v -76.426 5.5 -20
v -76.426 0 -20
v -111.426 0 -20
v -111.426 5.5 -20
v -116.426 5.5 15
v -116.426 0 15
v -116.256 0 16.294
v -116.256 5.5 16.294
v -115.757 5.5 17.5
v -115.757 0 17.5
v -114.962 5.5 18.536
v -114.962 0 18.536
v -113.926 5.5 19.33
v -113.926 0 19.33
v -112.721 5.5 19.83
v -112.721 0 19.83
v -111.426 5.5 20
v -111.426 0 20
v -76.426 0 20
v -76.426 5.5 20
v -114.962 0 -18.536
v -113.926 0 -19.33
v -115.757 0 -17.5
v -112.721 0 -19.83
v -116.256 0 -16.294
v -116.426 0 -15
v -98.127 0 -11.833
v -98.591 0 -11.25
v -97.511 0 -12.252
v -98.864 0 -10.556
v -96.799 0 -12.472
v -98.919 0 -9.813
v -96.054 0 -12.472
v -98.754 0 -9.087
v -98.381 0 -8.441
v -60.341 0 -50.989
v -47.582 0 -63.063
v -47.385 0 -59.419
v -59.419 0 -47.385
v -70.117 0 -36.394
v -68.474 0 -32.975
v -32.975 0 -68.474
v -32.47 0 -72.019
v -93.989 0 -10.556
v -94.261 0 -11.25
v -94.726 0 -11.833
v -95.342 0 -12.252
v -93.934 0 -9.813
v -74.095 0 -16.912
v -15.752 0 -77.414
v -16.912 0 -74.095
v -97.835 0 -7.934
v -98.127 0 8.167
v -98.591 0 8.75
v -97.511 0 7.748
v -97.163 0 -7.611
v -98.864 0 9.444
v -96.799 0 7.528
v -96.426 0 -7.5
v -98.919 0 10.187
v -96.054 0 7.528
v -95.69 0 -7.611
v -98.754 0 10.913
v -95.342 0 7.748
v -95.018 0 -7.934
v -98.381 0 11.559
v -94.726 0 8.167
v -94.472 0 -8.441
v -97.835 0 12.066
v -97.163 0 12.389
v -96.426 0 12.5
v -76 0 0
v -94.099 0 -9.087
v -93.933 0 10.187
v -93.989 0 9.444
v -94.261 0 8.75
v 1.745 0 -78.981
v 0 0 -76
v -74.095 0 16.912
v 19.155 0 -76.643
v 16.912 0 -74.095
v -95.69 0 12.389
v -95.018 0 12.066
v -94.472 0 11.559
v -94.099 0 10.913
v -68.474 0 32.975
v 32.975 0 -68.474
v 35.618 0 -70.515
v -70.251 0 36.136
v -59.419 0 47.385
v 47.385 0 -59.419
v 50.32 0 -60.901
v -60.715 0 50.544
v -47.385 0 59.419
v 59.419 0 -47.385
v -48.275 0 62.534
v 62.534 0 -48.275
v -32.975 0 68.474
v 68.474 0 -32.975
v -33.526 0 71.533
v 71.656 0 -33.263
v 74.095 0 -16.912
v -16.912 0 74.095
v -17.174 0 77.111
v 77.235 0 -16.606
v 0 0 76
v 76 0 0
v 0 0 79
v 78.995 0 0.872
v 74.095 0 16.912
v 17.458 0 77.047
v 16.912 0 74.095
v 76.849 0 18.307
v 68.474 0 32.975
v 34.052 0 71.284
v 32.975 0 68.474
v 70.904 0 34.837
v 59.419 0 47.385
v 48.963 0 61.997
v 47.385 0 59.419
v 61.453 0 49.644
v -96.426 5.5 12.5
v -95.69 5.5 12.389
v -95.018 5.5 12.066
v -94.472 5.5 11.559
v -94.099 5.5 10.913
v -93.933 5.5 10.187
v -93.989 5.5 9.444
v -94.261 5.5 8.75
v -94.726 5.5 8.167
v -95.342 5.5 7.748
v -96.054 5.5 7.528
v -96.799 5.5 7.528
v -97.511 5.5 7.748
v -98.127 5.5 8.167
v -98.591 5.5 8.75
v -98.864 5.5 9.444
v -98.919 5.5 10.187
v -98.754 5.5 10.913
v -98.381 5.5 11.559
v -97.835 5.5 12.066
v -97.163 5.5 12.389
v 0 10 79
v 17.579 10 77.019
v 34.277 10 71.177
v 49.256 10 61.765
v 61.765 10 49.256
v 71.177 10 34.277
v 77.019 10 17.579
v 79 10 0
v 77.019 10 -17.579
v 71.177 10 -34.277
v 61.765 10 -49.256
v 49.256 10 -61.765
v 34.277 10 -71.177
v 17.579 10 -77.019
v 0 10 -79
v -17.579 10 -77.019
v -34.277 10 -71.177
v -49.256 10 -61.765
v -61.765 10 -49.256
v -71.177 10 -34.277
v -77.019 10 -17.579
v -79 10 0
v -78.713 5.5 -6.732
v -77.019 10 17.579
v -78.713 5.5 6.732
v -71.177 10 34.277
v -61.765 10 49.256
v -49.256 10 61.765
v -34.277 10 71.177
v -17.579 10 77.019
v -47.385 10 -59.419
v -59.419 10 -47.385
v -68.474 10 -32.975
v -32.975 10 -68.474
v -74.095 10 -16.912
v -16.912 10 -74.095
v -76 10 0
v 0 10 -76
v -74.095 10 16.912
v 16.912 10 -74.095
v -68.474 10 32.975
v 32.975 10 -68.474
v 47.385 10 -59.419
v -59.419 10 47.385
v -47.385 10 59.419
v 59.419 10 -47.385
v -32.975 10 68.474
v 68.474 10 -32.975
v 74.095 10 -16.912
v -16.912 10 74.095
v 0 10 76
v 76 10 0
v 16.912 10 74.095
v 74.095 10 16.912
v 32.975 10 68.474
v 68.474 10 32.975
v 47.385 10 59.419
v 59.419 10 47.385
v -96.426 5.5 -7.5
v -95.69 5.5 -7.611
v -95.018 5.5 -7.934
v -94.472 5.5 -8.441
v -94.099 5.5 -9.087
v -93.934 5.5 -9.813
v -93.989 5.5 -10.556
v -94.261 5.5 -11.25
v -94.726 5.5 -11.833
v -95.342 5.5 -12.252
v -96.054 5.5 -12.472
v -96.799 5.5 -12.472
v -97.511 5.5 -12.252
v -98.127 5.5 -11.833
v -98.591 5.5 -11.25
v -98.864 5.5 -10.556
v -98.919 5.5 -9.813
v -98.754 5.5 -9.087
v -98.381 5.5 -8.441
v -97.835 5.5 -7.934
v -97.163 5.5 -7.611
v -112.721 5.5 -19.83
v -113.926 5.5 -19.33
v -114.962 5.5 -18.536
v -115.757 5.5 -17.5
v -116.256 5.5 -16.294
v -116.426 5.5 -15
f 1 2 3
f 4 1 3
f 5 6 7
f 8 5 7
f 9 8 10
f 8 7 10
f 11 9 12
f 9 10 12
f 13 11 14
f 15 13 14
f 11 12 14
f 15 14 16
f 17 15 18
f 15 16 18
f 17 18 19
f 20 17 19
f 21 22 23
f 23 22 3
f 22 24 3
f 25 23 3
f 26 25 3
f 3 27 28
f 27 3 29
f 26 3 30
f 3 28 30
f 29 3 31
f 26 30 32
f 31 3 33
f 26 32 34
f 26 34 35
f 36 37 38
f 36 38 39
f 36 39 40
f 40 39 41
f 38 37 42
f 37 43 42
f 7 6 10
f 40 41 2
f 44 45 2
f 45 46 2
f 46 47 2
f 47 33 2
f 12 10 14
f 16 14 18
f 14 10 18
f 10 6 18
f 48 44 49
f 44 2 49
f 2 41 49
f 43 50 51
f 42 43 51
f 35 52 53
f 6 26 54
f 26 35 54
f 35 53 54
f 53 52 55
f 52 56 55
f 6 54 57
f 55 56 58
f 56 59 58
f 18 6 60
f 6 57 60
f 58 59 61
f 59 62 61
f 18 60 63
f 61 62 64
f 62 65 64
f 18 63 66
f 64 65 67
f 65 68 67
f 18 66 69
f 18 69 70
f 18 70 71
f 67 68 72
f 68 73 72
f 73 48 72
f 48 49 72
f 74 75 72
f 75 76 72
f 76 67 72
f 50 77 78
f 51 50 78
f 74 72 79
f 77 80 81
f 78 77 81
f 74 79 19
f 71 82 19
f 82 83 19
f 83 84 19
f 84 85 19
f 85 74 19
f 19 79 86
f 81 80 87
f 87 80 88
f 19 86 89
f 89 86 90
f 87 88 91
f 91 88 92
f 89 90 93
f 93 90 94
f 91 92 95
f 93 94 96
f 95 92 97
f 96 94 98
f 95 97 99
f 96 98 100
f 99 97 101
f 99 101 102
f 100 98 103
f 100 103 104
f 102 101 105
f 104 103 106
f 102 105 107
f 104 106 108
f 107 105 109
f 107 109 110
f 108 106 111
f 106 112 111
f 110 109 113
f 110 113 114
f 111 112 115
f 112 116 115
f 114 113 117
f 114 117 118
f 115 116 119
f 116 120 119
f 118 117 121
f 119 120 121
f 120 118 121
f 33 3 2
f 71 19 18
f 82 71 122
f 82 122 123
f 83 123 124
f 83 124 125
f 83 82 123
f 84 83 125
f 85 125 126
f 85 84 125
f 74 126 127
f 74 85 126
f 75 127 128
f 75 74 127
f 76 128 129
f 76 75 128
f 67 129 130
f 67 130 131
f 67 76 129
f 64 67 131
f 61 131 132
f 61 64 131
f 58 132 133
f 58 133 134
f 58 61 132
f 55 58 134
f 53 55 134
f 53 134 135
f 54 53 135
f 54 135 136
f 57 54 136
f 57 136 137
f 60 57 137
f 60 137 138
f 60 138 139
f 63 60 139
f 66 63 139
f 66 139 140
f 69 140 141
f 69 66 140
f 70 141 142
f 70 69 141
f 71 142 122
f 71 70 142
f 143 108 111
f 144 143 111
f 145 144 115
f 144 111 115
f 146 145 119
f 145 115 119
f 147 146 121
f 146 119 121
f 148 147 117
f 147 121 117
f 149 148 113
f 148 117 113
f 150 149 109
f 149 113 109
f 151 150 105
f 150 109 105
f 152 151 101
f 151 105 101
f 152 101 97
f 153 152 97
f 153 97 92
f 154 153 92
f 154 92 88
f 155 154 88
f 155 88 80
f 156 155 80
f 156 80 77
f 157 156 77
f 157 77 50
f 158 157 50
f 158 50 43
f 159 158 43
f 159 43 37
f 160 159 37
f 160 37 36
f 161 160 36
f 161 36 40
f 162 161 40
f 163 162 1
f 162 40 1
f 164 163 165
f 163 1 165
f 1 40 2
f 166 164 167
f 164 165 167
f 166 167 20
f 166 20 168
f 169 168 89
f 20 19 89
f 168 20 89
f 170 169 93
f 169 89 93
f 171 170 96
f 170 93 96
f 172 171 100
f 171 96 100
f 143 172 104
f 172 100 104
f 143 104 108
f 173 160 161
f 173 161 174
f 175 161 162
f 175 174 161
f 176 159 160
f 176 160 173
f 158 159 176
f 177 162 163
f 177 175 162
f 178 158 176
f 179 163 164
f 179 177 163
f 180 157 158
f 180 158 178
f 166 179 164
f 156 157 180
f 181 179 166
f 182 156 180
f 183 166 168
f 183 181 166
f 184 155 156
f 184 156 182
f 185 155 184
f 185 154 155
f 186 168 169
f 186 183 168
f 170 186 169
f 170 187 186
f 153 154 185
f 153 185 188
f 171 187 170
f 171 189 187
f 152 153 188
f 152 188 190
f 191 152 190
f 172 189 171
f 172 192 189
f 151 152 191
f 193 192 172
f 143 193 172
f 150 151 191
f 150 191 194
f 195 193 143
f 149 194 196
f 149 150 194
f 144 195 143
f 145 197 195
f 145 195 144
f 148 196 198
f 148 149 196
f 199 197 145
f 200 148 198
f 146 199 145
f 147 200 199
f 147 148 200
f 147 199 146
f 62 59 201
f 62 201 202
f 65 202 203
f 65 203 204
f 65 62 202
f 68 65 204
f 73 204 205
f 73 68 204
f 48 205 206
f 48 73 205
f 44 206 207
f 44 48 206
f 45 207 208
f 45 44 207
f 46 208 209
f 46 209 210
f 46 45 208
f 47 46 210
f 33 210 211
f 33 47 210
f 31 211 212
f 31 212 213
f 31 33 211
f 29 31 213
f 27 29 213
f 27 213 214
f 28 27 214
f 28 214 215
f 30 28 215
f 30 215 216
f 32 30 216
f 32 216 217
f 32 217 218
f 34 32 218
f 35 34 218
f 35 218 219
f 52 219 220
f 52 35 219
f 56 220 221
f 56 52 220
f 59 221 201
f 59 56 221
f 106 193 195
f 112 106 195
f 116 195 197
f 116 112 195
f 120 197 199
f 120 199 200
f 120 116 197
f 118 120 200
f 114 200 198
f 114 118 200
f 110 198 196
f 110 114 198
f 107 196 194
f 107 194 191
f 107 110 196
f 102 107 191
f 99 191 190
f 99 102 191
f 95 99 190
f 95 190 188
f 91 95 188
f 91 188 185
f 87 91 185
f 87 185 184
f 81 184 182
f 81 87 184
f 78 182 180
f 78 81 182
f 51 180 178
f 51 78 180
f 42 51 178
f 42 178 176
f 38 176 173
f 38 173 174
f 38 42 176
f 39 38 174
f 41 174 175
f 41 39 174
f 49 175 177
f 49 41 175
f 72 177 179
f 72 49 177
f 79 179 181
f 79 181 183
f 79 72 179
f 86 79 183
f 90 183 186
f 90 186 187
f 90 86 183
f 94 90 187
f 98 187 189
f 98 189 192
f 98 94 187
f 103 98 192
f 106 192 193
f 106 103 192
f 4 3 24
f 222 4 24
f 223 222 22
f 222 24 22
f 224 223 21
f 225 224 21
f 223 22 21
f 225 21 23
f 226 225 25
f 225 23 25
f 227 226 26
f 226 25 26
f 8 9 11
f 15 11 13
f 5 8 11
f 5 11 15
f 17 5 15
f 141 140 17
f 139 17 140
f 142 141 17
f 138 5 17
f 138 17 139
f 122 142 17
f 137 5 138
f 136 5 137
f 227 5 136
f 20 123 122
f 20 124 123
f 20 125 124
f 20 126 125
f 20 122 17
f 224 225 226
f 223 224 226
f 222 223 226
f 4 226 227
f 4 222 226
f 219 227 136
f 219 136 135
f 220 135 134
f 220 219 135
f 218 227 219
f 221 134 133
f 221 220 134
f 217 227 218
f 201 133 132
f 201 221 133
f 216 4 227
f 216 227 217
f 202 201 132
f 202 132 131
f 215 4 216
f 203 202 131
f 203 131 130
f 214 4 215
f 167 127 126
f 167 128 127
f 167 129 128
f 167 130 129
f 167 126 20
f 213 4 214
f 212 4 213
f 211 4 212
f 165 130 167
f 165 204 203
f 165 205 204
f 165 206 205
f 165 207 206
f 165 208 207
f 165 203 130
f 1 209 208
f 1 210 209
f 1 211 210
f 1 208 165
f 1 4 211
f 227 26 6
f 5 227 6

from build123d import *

# Parameters (mm, degrees)
CROQUIS1_R              = 79
CROQUIS1_R_2            = 76
SALIENTE_EXTRUIR1_DEPTH = 10
CROQUIS2_R              = 2.499891185
CROQUIS2_R_2            = 2.5
SALIENTE_EXTRUIR2_DEPTH = 5.5


with BuildPart() as part:
    # Croquis1 → Saliente-Extruir1 (new body)
    with BuildSketch(Plane(origin=(0, 0, 0), x_dir=(1, 0, 0), z_dir=(0, 1, 0))):
        with Locations(Location((0, 0, 0), (0, 0, 270))):
            Circle(CROQUIS1_R)
        with Locations(Location((0, 0, 0), (0, 0, 270))):
            Circle(CROQUIS1_R_2, mode=Mode.SUBTRACT)
    extrude(amount=SALIENTE_EXTRUIR1_DEPTH)

    # Croquis2 → Saliente-Extruir2 (add)
    with BuildSketch(Plane(origin=(0, 0, 0), x_dir=(1, 0, 0), z_dir=(0, 1, 0))):
        with BuildLine():
            Line((-76.426435217, 20), (-111.426435217, 20))
            ThreePointArc((-111.426435217, 20), (-114.961969123, 18.535533906), (-116.426435217, 15))
            Line((-116.426435217, 15), (-116.426435217, -15))
            ThreePointArc((-116.426435217, -15), (-114.961969123, -18.535533906), (-111.426435217, -20))
            Line((-111.426435217, -20), (-76.426435217, -20))
            ThreePointArc((-76.426435217, -20), (-79, 0), (-76.426435217, 20))
        make_face()
        with Locations(Location((-96.426435217, 10, 0), (0, 0, 270))):
            Circle(CROQUIS2_R, mode=Mode.SUBTRACT)
        with Locations(Location((-96.426435217, -10, 0), (0, 0, 270))):
            Circle(CROQUIS2_R_2, mode=Mode.SUBTRACT)
    extrude(amount=SALIENTE_EXTRUIR2_DEPTH)


solid = part.part
